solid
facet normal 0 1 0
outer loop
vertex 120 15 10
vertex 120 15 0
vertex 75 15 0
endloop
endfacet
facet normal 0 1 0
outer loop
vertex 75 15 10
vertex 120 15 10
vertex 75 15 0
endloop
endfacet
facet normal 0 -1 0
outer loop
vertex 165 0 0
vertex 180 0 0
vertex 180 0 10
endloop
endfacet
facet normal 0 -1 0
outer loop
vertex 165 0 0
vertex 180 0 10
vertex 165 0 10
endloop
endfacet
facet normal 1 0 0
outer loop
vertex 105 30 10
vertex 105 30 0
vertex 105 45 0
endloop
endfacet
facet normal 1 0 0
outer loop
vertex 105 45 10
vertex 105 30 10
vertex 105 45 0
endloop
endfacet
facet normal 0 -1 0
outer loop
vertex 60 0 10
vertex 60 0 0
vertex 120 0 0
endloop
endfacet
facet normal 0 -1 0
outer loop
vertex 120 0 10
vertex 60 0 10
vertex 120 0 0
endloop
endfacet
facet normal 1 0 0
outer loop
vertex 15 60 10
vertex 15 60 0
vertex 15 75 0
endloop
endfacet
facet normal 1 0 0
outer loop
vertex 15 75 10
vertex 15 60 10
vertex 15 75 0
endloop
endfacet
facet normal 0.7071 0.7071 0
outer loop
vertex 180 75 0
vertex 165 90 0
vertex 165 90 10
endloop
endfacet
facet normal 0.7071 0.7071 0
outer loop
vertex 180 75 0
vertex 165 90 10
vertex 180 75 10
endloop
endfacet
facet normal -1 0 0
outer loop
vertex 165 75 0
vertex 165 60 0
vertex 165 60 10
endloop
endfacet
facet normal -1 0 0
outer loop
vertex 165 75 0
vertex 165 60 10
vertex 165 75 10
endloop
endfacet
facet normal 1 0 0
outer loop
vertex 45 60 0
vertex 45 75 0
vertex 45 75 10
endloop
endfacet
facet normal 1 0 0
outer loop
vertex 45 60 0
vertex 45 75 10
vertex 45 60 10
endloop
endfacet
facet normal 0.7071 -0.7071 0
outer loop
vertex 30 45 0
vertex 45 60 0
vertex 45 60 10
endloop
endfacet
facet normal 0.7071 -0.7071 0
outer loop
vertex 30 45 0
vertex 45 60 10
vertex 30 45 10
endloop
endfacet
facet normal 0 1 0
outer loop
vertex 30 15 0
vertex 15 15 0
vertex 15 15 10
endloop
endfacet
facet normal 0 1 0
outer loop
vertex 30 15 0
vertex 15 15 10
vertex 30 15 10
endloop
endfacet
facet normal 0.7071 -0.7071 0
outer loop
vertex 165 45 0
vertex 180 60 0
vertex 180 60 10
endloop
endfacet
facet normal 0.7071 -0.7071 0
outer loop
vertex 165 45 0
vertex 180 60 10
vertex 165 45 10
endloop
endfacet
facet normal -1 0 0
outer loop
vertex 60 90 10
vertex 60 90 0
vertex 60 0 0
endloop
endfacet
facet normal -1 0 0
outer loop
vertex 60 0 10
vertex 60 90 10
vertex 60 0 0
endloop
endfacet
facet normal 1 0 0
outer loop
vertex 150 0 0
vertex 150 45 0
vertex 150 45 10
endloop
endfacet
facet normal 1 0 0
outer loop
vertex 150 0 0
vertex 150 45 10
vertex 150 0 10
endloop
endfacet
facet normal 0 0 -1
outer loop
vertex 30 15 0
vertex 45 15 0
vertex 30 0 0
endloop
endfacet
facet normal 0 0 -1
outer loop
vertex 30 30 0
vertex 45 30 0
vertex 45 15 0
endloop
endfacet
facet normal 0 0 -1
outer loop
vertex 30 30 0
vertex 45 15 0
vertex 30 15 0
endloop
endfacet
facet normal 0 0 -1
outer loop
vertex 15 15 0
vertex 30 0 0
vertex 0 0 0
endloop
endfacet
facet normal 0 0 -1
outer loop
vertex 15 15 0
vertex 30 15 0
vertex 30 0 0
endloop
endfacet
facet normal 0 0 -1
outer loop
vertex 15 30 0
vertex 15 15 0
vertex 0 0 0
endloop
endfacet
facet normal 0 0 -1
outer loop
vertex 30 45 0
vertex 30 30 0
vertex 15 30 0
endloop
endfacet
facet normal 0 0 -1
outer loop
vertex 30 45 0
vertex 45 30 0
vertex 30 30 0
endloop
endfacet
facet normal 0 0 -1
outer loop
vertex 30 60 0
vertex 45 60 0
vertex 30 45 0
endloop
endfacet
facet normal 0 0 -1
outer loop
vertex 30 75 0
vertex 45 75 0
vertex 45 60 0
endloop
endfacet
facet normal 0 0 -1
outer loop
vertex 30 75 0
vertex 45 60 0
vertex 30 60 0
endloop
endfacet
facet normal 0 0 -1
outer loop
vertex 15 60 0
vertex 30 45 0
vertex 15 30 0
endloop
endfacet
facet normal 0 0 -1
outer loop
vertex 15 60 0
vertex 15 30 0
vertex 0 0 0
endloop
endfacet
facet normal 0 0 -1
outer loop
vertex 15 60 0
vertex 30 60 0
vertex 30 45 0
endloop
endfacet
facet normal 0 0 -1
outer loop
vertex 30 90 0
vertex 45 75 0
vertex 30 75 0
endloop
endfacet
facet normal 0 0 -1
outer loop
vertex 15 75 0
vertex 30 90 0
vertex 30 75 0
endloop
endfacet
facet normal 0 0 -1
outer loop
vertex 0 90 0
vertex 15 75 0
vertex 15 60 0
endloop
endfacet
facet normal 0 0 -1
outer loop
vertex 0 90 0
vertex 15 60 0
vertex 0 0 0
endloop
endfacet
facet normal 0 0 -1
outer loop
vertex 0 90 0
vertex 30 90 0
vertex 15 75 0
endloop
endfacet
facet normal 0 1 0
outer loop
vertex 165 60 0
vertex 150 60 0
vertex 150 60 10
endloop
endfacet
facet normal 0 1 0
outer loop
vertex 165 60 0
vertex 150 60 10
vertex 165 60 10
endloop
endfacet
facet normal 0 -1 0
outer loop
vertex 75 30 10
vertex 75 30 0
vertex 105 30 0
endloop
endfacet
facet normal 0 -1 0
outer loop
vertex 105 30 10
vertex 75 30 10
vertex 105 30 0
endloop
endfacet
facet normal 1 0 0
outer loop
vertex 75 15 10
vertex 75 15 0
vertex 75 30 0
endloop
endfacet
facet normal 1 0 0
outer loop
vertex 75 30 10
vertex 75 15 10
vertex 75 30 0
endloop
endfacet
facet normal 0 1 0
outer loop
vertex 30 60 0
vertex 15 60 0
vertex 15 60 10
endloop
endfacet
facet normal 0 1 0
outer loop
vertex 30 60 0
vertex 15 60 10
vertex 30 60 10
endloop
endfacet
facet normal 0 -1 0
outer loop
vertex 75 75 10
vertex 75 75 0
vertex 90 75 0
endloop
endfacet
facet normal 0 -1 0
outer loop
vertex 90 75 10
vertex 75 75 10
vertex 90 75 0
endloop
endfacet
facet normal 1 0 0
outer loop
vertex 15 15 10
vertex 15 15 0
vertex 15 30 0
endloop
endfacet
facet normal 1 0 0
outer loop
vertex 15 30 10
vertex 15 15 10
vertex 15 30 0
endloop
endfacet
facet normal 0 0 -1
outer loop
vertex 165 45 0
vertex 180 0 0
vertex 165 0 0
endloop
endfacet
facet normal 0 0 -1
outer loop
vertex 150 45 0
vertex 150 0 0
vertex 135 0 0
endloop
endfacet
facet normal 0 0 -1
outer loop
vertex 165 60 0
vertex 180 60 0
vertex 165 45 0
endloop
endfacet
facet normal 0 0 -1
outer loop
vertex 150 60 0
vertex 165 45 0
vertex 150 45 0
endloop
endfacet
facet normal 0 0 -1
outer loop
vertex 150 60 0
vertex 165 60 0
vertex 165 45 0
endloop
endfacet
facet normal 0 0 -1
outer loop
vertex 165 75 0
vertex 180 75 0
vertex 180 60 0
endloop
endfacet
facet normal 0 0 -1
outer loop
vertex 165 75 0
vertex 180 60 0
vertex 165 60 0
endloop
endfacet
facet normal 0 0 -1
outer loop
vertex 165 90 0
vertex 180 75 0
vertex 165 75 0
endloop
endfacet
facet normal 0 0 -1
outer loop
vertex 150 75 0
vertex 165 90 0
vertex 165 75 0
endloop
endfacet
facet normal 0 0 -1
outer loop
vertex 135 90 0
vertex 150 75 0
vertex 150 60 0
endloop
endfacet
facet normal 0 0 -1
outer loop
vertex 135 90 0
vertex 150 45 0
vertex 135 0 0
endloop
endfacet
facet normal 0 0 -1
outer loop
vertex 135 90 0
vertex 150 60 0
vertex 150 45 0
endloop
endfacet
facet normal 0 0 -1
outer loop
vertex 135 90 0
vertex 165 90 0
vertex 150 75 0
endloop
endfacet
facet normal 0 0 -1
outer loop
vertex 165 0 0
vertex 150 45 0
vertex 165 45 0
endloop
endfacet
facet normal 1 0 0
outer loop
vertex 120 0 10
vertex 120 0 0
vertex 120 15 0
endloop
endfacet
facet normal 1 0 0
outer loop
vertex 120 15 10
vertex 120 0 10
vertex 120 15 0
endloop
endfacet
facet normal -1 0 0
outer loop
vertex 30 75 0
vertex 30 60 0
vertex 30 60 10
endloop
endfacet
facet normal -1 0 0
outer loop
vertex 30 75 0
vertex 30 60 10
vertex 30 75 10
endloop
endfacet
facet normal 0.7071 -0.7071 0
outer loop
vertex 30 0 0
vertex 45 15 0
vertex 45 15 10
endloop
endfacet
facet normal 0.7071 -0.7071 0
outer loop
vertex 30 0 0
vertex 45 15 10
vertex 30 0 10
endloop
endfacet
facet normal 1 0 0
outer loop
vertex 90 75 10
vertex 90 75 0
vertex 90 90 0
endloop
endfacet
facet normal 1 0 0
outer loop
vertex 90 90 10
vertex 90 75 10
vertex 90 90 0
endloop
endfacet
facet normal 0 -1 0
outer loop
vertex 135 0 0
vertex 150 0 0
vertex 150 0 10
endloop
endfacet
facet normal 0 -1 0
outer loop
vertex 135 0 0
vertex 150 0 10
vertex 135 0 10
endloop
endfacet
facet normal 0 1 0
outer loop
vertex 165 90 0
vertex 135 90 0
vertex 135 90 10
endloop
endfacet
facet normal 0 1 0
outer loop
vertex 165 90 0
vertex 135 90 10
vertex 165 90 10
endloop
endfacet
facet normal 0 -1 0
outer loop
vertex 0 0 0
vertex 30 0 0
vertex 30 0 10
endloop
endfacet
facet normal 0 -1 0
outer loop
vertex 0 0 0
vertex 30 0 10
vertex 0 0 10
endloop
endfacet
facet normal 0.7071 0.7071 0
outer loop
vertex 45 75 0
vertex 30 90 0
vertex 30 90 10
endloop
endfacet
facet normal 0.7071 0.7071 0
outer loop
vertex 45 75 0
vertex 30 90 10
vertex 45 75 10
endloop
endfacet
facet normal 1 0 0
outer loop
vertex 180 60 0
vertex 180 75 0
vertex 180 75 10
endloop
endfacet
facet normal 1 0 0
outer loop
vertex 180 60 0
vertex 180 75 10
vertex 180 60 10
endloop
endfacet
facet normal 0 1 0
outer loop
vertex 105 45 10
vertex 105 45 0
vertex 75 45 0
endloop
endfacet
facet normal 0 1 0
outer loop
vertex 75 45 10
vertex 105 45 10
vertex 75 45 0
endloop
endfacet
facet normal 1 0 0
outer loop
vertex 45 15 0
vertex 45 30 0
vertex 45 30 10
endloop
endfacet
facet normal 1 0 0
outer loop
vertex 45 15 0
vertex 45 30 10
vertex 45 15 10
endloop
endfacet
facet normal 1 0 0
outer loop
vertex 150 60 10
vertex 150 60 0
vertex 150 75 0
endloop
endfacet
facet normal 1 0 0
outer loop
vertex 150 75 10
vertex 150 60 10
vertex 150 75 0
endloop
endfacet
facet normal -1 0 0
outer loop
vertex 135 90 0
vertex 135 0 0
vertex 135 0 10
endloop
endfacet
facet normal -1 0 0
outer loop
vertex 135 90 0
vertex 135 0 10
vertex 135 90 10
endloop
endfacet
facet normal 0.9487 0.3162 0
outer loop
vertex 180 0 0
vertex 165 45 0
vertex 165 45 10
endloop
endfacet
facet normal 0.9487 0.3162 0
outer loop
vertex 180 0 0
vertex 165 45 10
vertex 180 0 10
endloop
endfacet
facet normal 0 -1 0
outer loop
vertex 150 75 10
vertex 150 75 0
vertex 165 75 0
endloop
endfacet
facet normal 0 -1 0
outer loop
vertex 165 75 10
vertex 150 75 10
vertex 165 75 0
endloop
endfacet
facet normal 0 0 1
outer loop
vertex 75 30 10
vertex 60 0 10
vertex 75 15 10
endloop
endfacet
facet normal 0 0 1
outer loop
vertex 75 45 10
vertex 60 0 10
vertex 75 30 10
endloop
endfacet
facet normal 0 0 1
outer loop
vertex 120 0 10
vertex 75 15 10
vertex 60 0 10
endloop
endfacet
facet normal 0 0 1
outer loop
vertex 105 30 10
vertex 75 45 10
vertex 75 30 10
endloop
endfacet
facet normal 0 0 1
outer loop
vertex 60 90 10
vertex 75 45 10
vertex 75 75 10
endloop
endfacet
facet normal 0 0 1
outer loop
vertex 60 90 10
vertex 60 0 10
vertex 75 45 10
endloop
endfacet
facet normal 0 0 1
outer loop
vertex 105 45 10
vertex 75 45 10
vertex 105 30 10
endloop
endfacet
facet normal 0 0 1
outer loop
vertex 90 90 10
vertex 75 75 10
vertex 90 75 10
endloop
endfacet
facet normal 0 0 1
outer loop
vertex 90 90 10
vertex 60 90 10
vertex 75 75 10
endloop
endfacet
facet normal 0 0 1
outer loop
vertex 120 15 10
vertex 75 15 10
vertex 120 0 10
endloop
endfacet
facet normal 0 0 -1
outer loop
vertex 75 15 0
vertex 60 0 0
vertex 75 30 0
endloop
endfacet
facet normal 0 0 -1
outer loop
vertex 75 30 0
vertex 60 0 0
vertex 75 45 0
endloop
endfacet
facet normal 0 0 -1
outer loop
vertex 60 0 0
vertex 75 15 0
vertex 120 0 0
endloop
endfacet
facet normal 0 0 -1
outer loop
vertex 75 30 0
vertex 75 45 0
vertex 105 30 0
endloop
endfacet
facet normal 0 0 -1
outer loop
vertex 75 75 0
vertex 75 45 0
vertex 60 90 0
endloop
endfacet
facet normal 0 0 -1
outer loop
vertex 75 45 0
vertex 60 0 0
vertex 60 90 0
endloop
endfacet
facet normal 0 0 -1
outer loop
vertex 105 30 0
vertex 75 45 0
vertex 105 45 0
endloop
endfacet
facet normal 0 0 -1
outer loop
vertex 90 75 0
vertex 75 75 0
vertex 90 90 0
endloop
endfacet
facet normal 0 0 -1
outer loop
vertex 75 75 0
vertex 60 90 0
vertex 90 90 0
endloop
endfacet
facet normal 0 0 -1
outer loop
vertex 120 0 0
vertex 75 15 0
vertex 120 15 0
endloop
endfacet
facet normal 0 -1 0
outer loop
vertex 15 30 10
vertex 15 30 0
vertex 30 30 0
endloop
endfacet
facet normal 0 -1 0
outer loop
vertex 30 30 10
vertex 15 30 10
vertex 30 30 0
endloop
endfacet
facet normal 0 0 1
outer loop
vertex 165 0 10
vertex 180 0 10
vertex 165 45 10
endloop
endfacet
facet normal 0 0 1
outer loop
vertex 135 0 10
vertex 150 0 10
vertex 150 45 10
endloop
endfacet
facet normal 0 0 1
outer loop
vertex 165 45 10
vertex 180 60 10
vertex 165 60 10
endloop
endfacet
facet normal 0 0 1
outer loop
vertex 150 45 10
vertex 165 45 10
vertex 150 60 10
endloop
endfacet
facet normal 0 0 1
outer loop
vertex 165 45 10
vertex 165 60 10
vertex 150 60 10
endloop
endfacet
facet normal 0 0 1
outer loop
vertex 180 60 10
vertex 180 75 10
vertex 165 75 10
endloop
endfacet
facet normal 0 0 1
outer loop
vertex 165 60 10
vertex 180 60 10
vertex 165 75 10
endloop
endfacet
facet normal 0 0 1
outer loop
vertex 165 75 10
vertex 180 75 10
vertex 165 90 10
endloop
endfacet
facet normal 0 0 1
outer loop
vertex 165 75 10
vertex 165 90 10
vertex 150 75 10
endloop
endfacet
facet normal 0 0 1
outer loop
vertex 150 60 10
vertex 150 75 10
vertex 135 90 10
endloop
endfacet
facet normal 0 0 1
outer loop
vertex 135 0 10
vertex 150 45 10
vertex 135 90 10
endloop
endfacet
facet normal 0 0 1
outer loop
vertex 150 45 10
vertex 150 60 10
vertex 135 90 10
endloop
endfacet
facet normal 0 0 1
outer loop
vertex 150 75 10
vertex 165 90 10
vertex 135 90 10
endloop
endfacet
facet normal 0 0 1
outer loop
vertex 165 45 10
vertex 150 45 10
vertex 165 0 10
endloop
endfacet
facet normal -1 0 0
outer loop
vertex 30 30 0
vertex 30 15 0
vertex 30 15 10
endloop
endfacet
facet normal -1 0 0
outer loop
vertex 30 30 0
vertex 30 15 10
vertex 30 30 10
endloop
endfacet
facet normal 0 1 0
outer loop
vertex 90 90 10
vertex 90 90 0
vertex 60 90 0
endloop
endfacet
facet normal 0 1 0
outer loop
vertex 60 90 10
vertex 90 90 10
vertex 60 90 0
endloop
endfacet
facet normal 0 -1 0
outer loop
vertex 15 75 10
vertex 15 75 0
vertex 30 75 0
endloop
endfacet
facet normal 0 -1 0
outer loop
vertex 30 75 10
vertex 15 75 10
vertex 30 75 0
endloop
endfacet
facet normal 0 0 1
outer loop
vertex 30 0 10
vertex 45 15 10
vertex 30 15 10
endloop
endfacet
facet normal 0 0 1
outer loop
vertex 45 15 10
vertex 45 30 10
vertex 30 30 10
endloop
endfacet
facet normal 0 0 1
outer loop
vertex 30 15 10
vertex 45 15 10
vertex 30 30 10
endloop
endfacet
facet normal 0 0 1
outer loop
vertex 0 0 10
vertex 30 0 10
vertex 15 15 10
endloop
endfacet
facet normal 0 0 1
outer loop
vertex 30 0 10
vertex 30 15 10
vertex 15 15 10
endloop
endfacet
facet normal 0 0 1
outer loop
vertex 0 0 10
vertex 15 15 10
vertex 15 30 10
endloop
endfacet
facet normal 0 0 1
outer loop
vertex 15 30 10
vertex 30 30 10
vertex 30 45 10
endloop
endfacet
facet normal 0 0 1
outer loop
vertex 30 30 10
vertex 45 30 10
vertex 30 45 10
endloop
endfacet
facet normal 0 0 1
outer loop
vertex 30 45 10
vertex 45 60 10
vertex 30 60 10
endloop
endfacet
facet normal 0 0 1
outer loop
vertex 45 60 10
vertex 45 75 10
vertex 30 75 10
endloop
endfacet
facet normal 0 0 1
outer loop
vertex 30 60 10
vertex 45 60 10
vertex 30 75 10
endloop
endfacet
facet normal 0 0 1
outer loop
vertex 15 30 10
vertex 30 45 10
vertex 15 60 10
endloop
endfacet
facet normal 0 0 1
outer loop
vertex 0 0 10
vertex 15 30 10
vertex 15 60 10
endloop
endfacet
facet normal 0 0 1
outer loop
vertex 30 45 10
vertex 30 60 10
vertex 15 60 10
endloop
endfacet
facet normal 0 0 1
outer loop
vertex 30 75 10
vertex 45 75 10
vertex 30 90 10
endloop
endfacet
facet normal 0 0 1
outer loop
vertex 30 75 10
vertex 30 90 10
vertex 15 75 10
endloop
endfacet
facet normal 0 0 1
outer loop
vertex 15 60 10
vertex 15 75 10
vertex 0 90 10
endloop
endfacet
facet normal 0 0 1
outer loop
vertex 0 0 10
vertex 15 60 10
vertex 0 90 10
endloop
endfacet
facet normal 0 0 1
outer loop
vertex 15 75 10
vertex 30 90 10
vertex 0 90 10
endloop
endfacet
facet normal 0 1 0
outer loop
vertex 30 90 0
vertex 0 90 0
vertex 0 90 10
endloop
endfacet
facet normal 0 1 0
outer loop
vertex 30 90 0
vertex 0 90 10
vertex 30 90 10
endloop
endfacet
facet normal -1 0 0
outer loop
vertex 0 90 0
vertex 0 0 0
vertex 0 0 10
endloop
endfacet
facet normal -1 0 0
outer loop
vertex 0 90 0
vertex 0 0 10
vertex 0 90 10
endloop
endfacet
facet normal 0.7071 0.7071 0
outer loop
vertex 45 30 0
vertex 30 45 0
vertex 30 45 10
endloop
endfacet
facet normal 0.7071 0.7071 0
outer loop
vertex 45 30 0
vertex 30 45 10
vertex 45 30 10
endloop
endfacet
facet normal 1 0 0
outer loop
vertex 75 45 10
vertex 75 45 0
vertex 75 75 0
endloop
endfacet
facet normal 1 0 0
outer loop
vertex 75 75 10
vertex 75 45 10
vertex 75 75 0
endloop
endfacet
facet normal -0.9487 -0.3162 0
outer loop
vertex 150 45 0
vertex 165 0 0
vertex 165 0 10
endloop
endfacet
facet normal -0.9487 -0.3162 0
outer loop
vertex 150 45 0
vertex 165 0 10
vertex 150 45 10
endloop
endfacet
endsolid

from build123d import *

# Parameters (mm, degrees)
SKETCH2_W        = 15
SKETCH2_H        = 15
EXTRUDE1_DEPTH   = 10
EXTRUDE1_2_DEPTH = 10
EXTRUDE1_3_DEPTH = 10


with BuildPart() as part:
    # Sketch2 → Extrude1 (new body)
    with BuildSketch(Plane.XY):
        Polygon((30, 0), (0, 0), (0, 90), (30, 90), (45, 75), (45, 60), (30, 45), (45, 30), (45, 15), align=None)
        with Locations((22.5, 67.5)):
            Rectangle(SKETCH2_W, SKETCH2_H, mode=Mode.SUBTRACT)
        with Locations((22.5, 22.5)):
            Rectangle(SKETCH2_W, SKETCH2_H, mode=Mode.SUBTRACT)
    extrude(amount=EXTRUDE1_DEPTH)


with BuildPart() as body_2:
    # Sketch2 → Extrude1 2 (new body)
    with BuildSketch(Plane.XY):
        Polygon((60, 0), (120, 0), (120, 15), (75, 15), (75, 30), (105, 30), (105, 45), (75, 45), (75, 75), (90, 75), (90, 90), (60, 90), align=None)
    extrude(amount=EXTRUDE1_2_DEPTH)


with BuildPart() as body_3:
    # Sketch2 → Extrude1 3 (new body)
    with BuildSketch(Plane.XY):
        Polygon((150, 45), (150, 0), (135, 0), (135, 90), (165, 90), (180, 75), (180, 60), (165, 45), (180, 0), (165, 0), align=None)
        with Locations((157.5, 67.5)):
            Rectangle(SKETCH2_W, SKETCH2_H, mode=Mode.SUBTRACT)
    extrude(amount=EXTRUDE1_3_DEPTH)


solid = Compound([part.part, body_2.part, body_3.part])
